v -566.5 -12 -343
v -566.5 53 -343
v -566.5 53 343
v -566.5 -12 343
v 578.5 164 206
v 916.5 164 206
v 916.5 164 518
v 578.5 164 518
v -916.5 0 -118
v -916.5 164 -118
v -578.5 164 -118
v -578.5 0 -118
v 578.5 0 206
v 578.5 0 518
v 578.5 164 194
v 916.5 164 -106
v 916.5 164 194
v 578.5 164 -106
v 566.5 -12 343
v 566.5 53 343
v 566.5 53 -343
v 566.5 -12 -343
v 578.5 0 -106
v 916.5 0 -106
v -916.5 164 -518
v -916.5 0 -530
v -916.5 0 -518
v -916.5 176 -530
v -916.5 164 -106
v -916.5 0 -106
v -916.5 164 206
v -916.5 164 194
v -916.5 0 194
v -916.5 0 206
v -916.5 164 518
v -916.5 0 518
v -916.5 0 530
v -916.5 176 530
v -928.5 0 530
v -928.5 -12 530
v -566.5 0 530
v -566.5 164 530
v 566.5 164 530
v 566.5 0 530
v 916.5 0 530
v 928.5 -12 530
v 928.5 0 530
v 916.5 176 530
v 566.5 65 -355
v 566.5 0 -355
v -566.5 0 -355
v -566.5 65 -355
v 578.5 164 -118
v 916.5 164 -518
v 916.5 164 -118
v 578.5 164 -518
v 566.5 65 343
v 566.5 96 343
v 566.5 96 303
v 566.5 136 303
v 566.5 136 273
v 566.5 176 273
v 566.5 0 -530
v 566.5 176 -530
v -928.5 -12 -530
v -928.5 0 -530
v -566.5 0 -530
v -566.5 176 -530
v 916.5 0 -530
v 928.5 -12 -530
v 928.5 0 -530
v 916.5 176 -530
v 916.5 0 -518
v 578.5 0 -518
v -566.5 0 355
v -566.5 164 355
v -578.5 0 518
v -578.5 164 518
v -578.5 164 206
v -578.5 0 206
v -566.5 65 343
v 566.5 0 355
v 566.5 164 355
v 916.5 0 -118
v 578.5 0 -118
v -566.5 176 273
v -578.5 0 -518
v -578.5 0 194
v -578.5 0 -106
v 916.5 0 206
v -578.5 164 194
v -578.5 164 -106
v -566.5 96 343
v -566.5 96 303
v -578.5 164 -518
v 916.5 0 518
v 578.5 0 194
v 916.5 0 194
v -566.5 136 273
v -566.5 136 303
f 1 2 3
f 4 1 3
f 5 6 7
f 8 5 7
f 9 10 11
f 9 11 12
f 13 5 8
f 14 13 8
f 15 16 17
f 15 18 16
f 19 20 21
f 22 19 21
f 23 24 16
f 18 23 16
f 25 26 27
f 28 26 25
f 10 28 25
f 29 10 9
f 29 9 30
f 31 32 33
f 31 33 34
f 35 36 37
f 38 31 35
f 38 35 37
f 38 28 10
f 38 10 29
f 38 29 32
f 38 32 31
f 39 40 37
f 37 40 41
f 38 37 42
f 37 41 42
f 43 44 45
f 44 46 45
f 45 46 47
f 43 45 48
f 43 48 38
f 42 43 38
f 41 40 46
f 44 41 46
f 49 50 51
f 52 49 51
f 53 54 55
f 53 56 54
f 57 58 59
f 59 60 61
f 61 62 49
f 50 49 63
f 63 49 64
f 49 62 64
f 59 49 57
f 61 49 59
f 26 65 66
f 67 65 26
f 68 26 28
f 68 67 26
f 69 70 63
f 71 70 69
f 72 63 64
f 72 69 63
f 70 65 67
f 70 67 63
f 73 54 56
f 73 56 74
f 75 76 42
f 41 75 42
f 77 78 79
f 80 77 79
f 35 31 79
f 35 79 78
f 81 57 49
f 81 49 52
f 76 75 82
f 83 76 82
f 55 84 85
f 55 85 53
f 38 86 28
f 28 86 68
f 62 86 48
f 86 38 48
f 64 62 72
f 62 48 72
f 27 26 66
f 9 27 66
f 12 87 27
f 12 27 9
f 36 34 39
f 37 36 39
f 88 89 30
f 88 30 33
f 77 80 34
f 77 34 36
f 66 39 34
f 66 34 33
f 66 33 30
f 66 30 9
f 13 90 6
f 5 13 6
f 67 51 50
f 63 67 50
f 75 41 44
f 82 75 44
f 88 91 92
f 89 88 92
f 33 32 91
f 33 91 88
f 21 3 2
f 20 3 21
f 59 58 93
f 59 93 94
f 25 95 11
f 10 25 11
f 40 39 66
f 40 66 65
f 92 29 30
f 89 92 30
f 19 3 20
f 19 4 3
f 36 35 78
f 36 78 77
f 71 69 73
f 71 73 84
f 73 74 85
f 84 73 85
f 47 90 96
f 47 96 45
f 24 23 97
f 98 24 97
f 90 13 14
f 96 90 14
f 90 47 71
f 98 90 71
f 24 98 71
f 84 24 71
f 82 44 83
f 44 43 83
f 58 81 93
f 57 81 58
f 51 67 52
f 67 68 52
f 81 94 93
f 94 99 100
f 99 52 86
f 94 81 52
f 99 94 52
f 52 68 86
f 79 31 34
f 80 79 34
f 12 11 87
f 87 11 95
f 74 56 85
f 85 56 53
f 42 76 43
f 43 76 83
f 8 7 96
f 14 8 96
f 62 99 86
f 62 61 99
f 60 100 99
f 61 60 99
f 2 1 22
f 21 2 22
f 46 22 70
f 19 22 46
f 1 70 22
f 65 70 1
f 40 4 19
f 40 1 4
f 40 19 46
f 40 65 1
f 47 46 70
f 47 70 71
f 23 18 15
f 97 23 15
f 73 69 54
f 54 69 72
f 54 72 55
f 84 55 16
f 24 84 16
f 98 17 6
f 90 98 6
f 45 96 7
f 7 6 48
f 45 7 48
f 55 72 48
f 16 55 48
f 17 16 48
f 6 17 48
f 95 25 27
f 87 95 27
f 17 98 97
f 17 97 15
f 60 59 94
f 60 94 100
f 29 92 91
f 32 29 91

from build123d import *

# Parameters (mm, degrees)
F0_W          = 1800
F0_H          = 1060
F1_DEPTH      = 12
F3_W          = 333.5
F3_H          = 12
F4_DEPTH      = 176
F6_DEPTH      = 176
F8_DEPTH      = 566.5
F8_DEPTH_BACK = 566.5
F9_W          = 1133
F9_H          = 686
F10_DEPTH     = 25
F11_W         = 1133
F11_H         = 12
F12_DEPTH     = 176
F13_W         = 321.5
F13_H         = 1036
F14_DEPTH     = 12
F15_W         = 1133
F15_H         = 12
F16_DEPTH     = 343
F17_DEPTH     = 343
F18_W         = 1133
F18_H         = 12
F19_DEPTH     = 65
F21_W         = 164
F21_H         = 12
F22_DEPTH     = 321.5
F23_W         = 164
F23_H         = 12
F24_DEPTH     = 321.5
F25_W         = 1133
F25_H         = 12
F26_DEPTH     = 175
F27_W         = 12
F27_H         = 1060
F28_DEPTH     = 28.5
F29_W         = 12
F29_H         = 1060
F30_DEPTH     = 28.5
F31_DEPTH     = 16.5
F32_DEPTH     = 16.5


with BuildPart() as f1:
    # F0 (on Front) → F1 (new body)
    with BuildSketch(Plane.XZ):
        Rectangle(F0_W, F0_H)
    extrude(amount=F1_DEPTH)

    # F3 (on offset) → F4 (join, through all)
    with BuildSketch(Plane.XZ.offset(-176)):
        with Locations((-733.25, 524)):
            Rectangle(F3_W, F3_H)
        with Locations((733.25, 524)):
            Rectangle(F3_W, F3_H)
    extrude(amount=F4_DEPTH)

    # F5 (on offset) → F6 (join, through all)
    with BuildSketch(Plane.XZ.offset(-176)):
        Polygon((578.5, -518), (578.5, 518), (566.5, 518), (566.5, -530), (900, -530), (900, -518), align=None)
        Polygon((-900, -518), (-900, -530), (-566.5, -530), (-566.5, 518), (-578.5, 518), (-578.5, -518), align=None)
    extrude(amount=F6_DEPTH)

    # F7 (on Right) → F8 (join, two sides)
    with BuildSketch(Plane.YZ) as f8_sk:
        Polygon((176, 273), (176, 343), (96, 343), (96, 303), (136, 303), (136, 273), align=None)
    extrude(amount=F8_DEPTH)
    extrude(f8_sk.sketch, amount=-F8_DEPTH_BACK)

    # F9 (on face) → F10 (cut)
    with BuildSketch(Plane.XZ.offset(12)):
        Rectangle(F9_W, F9_H)
    extrude(amount=-F10_DEPTH, mode=Mode.SUBTRACT)

    # F11 (on face) → F12 (join, through all)
    with BuildSketch(Plane.XZ):
        with Locations((0, 349)):
            Rectangle(F11_W, F11_H)
    extrude(amount=-F12_DEPTH)

    # F13 (on face) → F14 (join)
    with BuildSketch(Plane(origin=(0, 176, 0), x_dir=(-1, 0, 0), z_dir=(0, 1, 0))):
        with Locations((739.25, 0)):
            Rectangle(F13_W, F13_H)
        with Locations((-739.25, 0)):
            Rectangle(F13_W, F13_H)
    extrude(amount=-F14_DEPTH)

    # F15 (on Top) → F16 (join, through all)
    with BuildSketch(Plane.XY):
        with Locations((0, 59)):
            Rectangle(F15_W, F15_H)
    extrude(amount=F16_DEPTH)

    # F15 (on Top) → F17 (join, through all)
    with BuildSketch(Plane.XY):
        with Locations((0, 59)):
            Rectangle(F15_W, F15_H)
    extrude(amount=-F17_DEPTH)

    # F18 (on face) → F19 (join, through all)
    with BuildSketch(Plane(origin=(0, 0, 0), x_dir=(-1, 0, 0), z_dir=(0, 1, 0))):
        with Locations((0, -349)):
            Rectangle(F18_W, F18_H)
    extrude(amount=F19_DEPTH)

    # F21 (on face) → F22 (join, through all)
    with BuildSketch(Plane(origin=(-578.5, 0, 0), x_dir=(0, -1, 0), z_dir=(-1, 0, 0))):
        with Locations((-82, -112)):
            Rectangle(F21_W, F21_H)
        with Locations((-82, 200)):
            Rectangle(F21_W, F21_H)
    extrude(amount=F22_DEPTH)

    # F23 (on face) → F24 (join, through all)
    with BuildSketch(Plane.YZ.offset(578.5)):
        with Locations((82, -112)):
            Rectangle(F23_W, F23_H)
        with Locations((82, 200)):
            Rectangle(F23_W, F23_H)
    extrude(amount=F24_DEPTH)

    # F25 (on face) → F26 (join, through all)
    with BuildSketch(Plane.XY.offset(355)):
        with Locations((0, 170)):
            Rectangle(F25_W, F25_H)
    extrude(amount=F26_DEPTH)

    # F27 (on face) → F28 (join)
    with BuildSketch(Plane(origin=(-900, 0, 0), x_dir=(0, -1, 0), z_dir=(-1, 0, 0))):
        with Locations((6, 0)):
            Rectangle(F27_W, F27_H)
    extrude(amount=F28_DEPTH)

    # F29 (on face) → F30 (join)
    with BuildSketch(Plane.YZ.offset(900)):
        with Locations((-6, 0)):
            Rectangle(F29_W, F29_H)
    extrude(amount=F30_DEPTH)

    # F31 (add): a face of the model
    f31_faces = [f1.faces().sort_by_distance(p)[0] for p in [
        (900, 88, -519.2548801775),
    ]]
    extrude(f31_faces, amount=F31_DEPTH)

    # F32 (add): a face of the model
    f32_faces = [f1.faces().sort_by_distance(p)[0] for p in [
        (-900, 88, 519.2548801775),
    ]]
    extrude(f32_faces, amount=F32_DEPTH)


solid = f1.part
